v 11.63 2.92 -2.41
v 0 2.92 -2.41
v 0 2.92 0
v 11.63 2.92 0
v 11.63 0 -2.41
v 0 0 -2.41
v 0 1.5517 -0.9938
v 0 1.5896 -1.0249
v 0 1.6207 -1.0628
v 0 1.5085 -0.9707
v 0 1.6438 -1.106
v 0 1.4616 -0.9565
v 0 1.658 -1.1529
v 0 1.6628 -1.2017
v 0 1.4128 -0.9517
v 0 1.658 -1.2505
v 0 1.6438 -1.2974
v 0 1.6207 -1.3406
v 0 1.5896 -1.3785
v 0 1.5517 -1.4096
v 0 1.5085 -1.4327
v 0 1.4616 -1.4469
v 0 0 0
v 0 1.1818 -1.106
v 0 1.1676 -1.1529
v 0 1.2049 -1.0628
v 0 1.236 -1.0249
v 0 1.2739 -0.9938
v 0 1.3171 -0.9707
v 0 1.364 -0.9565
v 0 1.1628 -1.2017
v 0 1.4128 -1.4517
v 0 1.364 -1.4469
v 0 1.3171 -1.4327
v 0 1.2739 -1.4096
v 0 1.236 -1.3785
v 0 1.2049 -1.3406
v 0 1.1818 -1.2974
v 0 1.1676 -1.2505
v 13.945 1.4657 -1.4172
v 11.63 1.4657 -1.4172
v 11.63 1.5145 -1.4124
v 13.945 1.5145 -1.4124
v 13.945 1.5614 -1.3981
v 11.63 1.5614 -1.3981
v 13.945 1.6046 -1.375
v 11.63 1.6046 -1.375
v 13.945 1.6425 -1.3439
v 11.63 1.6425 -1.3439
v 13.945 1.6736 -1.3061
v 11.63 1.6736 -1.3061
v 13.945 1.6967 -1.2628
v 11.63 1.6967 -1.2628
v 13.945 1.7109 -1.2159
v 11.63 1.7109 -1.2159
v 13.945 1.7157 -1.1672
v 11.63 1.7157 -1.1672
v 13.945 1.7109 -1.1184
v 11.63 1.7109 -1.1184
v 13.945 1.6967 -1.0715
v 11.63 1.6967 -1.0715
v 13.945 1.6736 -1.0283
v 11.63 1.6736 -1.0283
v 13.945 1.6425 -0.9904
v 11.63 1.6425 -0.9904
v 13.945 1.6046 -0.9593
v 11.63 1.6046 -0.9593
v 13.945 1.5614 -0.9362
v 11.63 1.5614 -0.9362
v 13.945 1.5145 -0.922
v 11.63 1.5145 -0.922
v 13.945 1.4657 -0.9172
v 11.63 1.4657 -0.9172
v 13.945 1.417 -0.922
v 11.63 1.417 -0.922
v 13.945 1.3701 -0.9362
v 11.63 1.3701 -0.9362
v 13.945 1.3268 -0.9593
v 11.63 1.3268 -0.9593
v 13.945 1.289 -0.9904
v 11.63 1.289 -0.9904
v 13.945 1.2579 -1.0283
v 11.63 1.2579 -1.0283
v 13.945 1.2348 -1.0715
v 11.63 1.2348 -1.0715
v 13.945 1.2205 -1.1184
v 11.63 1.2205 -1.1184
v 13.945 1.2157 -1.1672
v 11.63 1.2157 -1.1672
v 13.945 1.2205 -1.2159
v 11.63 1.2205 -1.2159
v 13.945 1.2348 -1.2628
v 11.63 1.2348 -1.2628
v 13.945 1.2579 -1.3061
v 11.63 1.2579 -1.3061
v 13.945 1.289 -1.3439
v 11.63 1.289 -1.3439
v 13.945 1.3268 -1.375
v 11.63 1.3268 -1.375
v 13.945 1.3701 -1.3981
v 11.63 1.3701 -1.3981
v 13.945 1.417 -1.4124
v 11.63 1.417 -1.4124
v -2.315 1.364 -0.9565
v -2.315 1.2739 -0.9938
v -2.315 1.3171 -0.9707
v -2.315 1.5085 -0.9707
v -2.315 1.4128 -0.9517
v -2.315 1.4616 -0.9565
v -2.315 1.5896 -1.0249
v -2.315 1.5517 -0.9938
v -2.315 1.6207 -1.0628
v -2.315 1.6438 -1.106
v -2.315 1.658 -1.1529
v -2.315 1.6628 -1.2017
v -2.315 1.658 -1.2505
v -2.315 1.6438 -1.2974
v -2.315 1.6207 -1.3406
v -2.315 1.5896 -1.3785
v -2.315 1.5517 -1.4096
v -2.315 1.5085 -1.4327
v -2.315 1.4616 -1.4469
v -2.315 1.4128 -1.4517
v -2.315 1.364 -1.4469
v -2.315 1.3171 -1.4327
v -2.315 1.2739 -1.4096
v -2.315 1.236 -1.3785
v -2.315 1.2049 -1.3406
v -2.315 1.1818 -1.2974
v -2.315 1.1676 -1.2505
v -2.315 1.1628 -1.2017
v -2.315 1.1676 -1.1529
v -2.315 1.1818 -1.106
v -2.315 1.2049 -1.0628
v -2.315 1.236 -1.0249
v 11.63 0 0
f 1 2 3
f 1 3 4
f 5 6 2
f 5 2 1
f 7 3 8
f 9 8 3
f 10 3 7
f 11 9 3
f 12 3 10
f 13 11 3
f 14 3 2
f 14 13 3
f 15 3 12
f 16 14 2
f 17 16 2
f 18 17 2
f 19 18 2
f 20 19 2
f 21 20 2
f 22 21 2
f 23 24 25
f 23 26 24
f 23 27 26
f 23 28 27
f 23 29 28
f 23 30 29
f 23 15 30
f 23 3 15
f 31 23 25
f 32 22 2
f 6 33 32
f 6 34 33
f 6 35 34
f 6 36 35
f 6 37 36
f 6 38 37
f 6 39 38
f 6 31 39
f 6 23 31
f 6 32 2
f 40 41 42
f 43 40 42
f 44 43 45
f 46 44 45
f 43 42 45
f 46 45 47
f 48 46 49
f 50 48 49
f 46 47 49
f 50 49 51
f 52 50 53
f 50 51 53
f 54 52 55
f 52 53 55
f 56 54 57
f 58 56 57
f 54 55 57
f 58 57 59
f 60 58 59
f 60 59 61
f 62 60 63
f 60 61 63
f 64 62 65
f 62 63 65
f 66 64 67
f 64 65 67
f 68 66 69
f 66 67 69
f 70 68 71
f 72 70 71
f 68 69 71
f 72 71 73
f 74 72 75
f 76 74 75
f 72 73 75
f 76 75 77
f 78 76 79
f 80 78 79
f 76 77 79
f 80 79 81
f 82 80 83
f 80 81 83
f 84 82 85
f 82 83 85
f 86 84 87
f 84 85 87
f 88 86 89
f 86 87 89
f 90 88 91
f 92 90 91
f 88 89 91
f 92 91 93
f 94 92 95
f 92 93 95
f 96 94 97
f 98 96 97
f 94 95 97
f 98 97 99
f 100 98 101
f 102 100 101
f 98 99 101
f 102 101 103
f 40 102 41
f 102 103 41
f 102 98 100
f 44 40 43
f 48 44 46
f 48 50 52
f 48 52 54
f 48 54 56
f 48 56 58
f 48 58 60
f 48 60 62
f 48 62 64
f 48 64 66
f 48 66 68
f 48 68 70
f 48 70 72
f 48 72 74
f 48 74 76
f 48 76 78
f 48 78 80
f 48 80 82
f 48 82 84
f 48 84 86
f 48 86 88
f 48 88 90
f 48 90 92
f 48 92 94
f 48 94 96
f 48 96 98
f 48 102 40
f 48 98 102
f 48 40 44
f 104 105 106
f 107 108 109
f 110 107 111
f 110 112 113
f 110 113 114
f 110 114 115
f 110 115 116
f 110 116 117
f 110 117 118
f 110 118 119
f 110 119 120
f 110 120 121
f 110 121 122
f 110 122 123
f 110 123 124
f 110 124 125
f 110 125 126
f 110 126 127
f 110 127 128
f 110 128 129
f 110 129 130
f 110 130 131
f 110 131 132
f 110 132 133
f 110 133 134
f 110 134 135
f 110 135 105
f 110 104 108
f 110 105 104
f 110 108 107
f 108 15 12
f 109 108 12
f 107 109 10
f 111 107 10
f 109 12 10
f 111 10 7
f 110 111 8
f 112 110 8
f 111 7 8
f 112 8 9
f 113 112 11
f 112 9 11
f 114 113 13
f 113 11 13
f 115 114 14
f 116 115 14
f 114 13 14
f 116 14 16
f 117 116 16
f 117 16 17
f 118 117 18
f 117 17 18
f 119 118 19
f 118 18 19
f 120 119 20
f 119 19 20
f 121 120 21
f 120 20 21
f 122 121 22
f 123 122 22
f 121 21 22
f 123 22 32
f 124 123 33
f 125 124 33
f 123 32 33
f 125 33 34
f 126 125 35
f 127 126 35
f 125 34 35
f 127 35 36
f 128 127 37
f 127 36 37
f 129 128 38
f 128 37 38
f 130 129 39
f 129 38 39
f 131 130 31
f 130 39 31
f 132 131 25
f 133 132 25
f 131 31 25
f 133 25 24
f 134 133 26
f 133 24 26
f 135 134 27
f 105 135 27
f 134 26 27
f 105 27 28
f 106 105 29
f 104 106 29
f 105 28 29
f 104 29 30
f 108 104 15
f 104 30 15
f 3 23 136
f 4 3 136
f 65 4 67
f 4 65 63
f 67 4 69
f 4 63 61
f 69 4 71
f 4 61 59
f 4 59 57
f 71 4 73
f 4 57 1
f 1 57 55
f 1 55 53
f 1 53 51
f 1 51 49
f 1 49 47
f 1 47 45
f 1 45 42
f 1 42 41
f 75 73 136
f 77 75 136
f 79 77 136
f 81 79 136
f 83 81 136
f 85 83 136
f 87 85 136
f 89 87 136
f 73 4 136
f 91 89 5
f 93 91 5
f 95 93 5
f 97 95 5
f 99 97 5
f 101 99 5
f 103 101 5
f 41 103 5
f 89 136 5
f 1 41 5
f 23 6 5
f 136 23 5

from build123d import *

# Parameters (mm, degrees)
SKETCH1_W           = 11.63
SKETCH1_H           = 2.41
BOSS_EXTRUDE1_DEPTH = 2.92
SKETCH2_R           = 0.25
BOSS_EXTRUDE2_DEPTH = 2.315
SKETCH3_R           = 0.25
BOSS_EXTRUDE3_DEPTH = 2.315


with BuildPart() as part:
    # Sketch1 → Boss-Extrude1 (new body)
    with BuildSketch(Plane(origin=(0, 0, 0), x_dir=(1, 0, 0), z_dir=(0, 1, 0))):
        with Locations((5.815, 1.205)):
            Rectangle(SKETCH1_W, SKETCH1_H)
    extrude(amount=BOSS_EXTRUDE1_DEPTH)

    # Sketch2 → Boss-Extrude2 (add)
    with BuildSketch(Plane(origin=(11.63, 0, 0), x_dir=(0, 0, -1), z_dir=(1, 0, 0))):
        with Locations((1.167158441, 1.465733238)):
            Circle(SKETCH2_R)
    extrude(amount=BOSS_EXTRUDE2_DEPTH)

    # Sketch3 → Boss-Extrude3 (add)
    with BuildSketch(Plane.ZY):
        with Locations((-1.201708257, 1.412791091)):
            Circle(SKETCH3_R)
    extrude(amount=BOSS_EXTRUDE3_DEPTH)


solid = part.part
